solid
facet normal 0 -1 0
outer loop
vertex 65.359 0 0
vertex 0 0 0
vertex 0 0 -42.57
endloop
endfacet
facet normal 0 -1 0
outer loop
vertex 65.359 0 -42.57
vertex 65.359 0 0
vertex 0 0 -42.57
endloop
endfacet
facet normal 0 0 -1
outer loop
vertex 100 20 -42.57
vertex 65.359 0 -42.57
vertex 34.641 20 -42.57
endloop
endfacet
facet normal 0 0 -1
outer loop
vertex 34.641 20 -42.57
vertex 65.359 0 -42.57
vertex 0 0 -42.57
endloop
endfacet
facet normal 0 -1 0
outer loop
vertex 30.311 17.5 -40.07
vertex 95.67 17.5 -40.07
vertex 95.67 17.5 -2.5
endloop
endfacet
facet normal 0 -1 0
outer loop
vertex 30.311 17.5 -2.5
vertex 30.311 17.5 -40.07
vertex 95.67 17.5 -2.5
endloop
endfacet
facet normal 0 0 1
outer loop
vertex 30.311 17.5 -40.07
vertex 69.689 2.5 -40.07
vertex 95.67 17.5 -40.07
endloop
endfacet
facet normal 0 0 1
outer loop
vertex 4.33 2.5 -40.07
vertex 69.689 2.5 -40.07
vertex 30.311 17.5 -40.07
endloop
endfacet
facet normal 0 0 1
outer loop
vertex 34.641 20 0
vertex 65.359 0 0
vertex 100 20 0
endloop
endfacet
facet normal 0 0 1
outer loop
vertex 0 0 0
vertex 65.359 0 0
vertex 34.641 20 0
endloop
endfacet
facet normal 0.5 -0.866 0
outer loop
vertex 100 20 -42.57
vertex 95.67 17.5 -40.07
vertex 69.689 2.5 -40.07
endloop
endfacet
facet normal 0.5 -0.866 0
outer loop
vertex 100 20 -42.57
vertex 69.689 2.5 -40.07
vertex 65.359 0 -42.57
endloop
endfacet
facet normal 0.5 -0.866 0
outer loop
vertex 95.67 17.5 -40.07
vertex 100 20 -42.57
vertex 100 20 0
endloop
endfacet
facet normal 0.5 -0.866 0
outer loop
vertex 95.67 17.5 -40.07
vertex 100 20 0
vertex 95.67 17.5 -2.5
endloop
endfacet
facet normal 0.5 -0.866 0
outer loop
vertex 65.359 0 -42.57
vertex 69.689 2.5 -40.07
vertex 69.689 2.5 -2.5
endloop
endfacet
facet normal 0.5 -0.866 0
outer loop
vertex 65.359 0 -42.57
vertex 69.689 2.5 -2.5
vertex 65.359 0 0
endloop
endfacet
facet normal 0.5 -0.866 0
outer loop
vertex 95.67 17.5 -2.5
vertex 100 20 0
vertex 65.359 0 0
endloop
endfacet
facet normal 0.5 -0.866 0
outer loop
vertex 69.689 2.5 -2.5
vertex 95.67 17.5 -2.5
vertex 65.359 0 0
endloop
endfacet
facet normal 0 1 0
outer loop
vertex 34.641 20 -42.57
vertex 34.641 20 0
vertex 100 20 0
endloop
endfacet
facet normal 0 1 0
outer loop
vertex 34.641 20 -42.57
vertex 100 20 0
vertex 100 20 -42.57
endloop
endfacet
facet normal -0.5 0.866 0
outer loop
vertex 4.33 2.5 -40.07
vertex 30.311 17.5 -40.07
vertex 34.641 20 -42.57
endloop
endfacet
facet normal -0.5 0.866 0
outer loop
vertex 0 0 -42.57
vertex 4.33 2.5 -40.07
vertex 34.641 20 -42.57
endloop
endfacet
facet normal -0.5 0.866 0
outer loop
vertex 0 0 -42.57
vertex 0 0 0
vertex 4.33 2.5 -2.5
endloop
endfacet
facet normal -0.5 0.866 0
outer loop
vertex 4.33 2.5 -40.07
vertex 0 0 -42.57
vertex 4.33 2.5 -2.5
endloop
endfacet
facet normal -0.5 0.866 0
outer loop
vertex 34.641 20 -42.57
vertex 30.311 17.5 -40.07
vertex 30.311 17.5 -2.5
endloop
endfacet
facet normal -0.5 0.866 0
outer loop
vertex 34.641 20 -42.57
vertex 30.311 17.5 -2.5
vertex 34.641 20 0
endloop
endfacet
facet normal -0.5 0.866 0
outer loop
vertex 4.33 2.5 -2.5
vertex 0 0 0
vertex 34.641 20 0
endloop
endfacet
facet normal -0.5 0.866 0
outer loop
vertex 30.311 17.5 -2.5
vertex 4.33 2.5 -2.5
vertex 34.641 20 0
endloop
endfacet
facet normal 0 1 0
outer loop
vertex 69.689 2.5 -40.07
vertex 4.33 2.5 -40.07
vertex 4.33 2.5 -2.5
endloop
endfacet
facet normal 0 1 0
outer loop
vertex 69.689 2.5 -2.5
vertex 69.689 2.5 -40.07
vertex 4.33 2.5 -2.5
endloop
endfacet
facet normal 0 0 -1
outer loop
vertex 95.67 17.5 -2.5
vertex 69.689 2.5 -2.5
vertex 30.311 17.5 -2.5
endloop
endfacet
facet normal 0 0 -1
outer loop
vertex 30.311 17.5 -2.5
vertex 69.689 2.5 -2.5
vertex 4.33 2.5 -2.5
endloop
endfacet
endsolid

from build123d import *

# Parameters (mm, degrees)
SKETCH1_W           = 42.57
SKETCH1_H           = 20
BOSS_EXTRUDE1_DEPTH = 100
SKETCH2_W           = 37.57
SKETCH2_H           = 15
CUT_EXTRUDE1_DEPTH  = 111.508845347
CUT_EXTRUDE2_DEPTH  = 111.508845347


with BuildPart() as part:
    # Sketch1 → Boss-Extrude1 (new body)
    with BuildSketch(Plane(origin=(0, 0, 0), x_dir=(0, 0, -1), z_dir=(1, 0, 0))):
        with Locations((21.285, 10)):
            Rectangle(SKETCH1_W, SKETCH1_H)
    extrude(amount=BOSS_EXTRUDE1_DEPTH)

    # Sketch2 → Cut-Extrude1 (cut, through all)
    with BuildSketch(Plane.ZY):
        with Locations((-21.285, 10)):
            Rectangle(SKETCH2_W, SKETCH2_H)
    extrude(amount=-CUT_EXTRUDE1_DEPTH, mode=Mode.SUBTRACT)

    # Sketch3 → Cut-Extrude2 (cut, through all)
    with BuildSketch(Plane.XY):
        Polygon((0, 0), (34.641016151, 20), (0, 20), align=None)
        Polygon((100, 20), (65.358983849, 0), (100, 0), align=None)
    extrude(amount=-CUT_EXTRUDE2_DEPTH, mode=Mode.SUBTRACT)


solid = part.part
